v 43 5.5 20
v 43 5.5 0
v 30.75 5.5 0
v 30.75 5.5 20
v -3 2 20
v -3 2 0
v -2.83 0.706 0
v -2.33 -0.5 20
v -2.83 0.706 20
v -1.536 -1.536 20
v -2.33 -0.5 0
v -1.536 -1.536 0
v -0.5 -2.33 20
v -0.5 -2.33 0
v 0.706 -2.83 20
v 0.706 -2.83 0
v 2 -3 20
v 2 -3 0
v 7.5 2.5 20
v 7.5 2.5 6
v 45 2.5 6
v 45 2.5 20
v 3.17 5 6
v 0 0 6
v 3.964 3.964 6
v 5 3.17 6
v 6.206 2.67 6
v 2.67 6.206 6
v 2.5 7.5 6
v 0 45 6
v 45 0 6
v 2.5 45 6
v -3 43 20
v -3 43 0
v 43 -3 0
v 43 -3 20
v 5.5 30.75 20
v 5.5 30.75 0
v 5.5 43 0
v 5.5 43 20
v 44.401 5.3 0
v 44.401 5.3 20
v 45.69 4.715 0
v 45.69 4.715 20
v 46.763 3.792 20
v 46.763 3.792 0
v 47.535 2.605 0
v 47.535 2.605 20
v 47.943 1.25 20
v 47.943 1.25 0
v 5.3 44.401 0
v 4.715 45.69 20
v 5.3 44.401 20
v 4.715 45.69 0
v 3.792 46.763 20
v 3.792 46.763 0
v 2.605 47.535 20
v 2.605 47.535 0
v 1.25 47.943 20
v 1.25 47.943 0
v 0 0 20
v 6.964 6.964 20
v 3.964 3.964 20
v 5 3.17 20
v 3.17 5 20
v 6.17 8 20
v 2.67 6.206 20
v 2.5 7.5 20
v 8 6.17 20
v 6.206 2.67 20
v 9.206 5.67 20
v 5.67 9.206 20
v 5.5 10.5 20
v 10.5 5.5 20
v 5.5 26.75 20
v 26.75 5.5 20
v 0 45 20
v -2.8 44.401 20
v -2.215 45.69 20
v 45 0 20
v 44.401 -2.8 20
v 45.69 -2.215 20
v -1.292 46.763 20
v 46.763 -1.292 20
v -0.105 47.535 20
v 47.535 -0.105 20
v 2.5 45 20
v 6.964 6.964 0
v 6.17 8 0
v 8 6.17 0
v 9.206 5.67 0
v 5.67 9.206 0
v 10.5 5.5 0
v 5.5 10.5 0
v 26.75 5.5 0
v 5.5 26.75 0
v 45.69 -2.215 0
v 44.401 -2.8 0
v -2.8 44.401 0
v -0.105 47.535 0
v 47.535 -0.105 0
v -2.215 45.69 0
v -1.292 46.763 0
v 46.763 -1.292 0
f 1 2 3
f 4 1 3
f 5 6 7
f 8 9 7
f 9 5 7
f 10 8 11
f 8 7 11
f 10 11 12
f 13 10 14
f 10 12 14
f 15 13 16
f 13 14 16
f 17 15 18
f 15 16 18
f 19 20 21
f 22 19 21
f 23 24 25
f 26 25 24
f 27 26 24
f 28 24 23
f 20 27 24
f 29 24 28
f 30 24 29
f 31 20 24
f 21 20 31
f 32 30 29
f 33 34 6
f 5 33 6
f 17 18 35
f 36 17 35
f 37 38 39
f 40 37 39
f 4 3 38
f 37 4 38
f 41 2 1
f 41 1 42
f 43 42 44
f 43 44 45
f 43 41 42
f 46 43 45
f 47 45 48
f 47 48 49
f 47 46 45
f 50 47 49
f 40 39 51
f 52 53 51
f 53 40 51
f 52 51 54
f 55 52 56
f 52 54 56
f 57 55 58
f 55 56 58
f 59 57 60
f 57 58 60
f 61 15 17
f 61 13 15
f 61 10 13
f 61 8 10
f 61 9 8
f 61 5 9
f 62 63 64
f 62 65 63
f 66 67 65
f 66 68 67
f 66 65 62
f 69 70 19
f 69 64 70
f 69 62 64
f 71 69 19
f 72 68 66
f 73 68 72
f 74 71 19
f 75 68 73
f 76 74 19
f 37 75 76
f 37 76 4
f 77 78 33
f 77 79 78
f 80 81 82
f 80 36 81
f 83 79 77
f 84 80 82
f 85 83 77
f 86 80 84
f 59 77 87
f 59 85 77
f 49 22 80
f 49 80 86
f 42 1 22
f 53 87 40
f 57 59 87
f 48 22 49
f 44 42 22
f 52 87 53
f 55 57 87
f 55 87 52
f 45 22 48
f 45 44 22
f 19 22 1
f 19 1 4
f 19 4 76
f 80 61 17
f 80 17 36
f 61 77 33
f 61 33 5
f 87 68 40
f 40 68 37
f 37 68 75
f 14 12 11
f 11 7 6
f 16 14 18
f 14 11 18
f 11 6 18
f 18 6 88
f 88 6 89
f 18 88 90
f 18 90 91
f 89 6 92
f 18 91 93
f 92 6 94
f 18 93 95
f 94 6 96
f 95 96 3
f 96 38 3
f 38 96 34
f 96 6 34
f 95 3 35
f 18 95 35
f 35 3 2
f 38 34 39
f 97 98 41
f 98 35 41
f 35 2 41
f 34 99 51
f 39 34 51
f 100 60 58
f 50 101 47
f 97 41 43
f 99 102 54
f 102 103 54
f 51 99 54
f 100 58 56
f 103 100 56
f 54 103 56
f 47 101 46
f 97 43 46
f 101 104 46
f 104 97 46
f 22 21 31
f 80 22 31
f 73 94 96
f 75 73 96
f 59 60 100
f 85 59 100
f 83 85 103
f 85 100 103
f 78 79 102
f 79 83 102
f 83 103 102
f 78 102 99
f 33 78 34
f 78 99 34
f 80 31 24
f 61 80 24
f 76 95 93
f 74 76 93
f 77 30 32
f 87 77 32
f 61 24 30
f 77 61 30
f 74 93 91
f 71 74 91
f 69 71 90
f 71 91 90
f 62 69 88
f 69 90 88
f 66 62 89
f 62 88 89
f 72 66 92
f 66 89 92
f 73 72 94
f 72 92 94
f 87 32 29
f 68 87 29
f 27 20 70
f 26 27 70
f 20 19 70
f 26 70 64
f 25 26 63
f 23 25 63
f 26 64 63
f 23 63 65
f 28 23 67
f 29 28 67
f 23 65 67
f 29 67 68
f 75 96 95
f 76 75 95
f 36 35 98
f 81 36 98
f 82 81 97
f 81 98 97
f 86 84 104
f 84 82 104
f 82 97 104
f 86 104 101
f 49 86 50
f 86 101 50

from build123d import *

# Parameters (mm, degrees)
F1_DEPTH    = 20
F2_DEPTH    = 6
F3_T1_DEPTH = 20
F3_T3_DEPTH = 45
F4_R        = 5


# Not quite as in the source:
# - a fillet or chamfer that OpenCascade refuses, or shapes differently, is made with other operations: its cross-section is extruded or revolved along the edge and cut away or added


with BuildPart() as f1:
    # F0 (on Top) → F1 (new body)
    with BuildSketch(Plane.XY):
        Polygon((5.5, 30.75), (5.5, 48), (-3, 48), (-3, -3), (48, -3), (48, 5.5), (30.75, 5.5), (26.75, 5.5), (5.5, 5.5), (5.5, 26.75), align=None)
        Polygon((0, 0), (0, 45), (2.5, 45), (2.5, 2.5), (45, 2.5), (45, 0), align=None, mode=Mode.SUBTRACT)
        Polygon((30.75, 5.5), (5.5, 30.75), (5.5, 26.75), (26.75, 5.5), align=None)
    extrude(amount=F1_DEPTH)

    # F0 (on Top) → F2 (join)
    with BuildSketch(Plane.XY):
        Polygon((2.5, 45), (0, 45), (0, 0), (45, 0), (45, 2.5), (2.5, 2.5), align=None)
    extrude(amount=F2_DEPTH)

    # F3: fillet of radius 5 on 6 edges, made by hand

    # F3_s2 → F3_t1 (join)
    with BuildSketch(Plane.XY):
        with BuildLine():
            ThreePointArc((10.5, 5.5), (6.9644660941, 6.9644660941), (5.5, 10.5))
            Line((5.5, 10.5), (5.5, 5.5))
            Line((5.5, 5.5), (10.5, 5.5))
        make_face()
    extrude(amount=F3_T1_DEPTH)

    # F3_s4 → F3_t3 (cut)
    with BuildSketch(Plane.XY.offset(-12.5)):
        with BuildLine():
            ThreePointArc((43, 5.5), (46.5355339059, 4.0355339059), (48, 0.5))
            Line((48, 0.5), (48, 5.5))
            Line((48, 5.5), (43, 5.5))
        make_face()
        with BuildLine():
            ThreePointArc((43, -3), (46.5355339059, -1.5355339059), (48, 2))
            Line((48, 2), (48, -3))
            Line((48, -3), (43, -3))
        make_face()
        with BuildLine():
            ThreePointArc((5.5, 43), (4.0355339059, 46.5355339059), (0.5, 48))
            Line((0.5, 48), (5.5, 48))
            Line((5.5, 48), (5.5, 43))
        make_face()
        with BuildLine():
            ThreePointArc((2, 48), (-1.5355339059, 46.5355339059), (-3, 43))
            Line((-3, 43), (-3, 48))
            Line((-3, 48), (2, 48))
        make_face()
        with BuildLine():
            ThreePointArc((-3, 2), (-1.5355339059, -1.5355339059), (2, -3))
            Line((2, -3), (-3, -3))
            Line((-3, -3), (-3, 2))
        make_face()
    extrude(amount=F3_T3_DEPTH, mode=Mode.SUBTRACT)

    # F4
    f4_edges = [f1.edges().sort_by_distance(p)[0] for p in [
        (2.5, 2.5, 13),
    ]]
    fillet(f4_edges, radius=F4_R)


solid = f1.part
